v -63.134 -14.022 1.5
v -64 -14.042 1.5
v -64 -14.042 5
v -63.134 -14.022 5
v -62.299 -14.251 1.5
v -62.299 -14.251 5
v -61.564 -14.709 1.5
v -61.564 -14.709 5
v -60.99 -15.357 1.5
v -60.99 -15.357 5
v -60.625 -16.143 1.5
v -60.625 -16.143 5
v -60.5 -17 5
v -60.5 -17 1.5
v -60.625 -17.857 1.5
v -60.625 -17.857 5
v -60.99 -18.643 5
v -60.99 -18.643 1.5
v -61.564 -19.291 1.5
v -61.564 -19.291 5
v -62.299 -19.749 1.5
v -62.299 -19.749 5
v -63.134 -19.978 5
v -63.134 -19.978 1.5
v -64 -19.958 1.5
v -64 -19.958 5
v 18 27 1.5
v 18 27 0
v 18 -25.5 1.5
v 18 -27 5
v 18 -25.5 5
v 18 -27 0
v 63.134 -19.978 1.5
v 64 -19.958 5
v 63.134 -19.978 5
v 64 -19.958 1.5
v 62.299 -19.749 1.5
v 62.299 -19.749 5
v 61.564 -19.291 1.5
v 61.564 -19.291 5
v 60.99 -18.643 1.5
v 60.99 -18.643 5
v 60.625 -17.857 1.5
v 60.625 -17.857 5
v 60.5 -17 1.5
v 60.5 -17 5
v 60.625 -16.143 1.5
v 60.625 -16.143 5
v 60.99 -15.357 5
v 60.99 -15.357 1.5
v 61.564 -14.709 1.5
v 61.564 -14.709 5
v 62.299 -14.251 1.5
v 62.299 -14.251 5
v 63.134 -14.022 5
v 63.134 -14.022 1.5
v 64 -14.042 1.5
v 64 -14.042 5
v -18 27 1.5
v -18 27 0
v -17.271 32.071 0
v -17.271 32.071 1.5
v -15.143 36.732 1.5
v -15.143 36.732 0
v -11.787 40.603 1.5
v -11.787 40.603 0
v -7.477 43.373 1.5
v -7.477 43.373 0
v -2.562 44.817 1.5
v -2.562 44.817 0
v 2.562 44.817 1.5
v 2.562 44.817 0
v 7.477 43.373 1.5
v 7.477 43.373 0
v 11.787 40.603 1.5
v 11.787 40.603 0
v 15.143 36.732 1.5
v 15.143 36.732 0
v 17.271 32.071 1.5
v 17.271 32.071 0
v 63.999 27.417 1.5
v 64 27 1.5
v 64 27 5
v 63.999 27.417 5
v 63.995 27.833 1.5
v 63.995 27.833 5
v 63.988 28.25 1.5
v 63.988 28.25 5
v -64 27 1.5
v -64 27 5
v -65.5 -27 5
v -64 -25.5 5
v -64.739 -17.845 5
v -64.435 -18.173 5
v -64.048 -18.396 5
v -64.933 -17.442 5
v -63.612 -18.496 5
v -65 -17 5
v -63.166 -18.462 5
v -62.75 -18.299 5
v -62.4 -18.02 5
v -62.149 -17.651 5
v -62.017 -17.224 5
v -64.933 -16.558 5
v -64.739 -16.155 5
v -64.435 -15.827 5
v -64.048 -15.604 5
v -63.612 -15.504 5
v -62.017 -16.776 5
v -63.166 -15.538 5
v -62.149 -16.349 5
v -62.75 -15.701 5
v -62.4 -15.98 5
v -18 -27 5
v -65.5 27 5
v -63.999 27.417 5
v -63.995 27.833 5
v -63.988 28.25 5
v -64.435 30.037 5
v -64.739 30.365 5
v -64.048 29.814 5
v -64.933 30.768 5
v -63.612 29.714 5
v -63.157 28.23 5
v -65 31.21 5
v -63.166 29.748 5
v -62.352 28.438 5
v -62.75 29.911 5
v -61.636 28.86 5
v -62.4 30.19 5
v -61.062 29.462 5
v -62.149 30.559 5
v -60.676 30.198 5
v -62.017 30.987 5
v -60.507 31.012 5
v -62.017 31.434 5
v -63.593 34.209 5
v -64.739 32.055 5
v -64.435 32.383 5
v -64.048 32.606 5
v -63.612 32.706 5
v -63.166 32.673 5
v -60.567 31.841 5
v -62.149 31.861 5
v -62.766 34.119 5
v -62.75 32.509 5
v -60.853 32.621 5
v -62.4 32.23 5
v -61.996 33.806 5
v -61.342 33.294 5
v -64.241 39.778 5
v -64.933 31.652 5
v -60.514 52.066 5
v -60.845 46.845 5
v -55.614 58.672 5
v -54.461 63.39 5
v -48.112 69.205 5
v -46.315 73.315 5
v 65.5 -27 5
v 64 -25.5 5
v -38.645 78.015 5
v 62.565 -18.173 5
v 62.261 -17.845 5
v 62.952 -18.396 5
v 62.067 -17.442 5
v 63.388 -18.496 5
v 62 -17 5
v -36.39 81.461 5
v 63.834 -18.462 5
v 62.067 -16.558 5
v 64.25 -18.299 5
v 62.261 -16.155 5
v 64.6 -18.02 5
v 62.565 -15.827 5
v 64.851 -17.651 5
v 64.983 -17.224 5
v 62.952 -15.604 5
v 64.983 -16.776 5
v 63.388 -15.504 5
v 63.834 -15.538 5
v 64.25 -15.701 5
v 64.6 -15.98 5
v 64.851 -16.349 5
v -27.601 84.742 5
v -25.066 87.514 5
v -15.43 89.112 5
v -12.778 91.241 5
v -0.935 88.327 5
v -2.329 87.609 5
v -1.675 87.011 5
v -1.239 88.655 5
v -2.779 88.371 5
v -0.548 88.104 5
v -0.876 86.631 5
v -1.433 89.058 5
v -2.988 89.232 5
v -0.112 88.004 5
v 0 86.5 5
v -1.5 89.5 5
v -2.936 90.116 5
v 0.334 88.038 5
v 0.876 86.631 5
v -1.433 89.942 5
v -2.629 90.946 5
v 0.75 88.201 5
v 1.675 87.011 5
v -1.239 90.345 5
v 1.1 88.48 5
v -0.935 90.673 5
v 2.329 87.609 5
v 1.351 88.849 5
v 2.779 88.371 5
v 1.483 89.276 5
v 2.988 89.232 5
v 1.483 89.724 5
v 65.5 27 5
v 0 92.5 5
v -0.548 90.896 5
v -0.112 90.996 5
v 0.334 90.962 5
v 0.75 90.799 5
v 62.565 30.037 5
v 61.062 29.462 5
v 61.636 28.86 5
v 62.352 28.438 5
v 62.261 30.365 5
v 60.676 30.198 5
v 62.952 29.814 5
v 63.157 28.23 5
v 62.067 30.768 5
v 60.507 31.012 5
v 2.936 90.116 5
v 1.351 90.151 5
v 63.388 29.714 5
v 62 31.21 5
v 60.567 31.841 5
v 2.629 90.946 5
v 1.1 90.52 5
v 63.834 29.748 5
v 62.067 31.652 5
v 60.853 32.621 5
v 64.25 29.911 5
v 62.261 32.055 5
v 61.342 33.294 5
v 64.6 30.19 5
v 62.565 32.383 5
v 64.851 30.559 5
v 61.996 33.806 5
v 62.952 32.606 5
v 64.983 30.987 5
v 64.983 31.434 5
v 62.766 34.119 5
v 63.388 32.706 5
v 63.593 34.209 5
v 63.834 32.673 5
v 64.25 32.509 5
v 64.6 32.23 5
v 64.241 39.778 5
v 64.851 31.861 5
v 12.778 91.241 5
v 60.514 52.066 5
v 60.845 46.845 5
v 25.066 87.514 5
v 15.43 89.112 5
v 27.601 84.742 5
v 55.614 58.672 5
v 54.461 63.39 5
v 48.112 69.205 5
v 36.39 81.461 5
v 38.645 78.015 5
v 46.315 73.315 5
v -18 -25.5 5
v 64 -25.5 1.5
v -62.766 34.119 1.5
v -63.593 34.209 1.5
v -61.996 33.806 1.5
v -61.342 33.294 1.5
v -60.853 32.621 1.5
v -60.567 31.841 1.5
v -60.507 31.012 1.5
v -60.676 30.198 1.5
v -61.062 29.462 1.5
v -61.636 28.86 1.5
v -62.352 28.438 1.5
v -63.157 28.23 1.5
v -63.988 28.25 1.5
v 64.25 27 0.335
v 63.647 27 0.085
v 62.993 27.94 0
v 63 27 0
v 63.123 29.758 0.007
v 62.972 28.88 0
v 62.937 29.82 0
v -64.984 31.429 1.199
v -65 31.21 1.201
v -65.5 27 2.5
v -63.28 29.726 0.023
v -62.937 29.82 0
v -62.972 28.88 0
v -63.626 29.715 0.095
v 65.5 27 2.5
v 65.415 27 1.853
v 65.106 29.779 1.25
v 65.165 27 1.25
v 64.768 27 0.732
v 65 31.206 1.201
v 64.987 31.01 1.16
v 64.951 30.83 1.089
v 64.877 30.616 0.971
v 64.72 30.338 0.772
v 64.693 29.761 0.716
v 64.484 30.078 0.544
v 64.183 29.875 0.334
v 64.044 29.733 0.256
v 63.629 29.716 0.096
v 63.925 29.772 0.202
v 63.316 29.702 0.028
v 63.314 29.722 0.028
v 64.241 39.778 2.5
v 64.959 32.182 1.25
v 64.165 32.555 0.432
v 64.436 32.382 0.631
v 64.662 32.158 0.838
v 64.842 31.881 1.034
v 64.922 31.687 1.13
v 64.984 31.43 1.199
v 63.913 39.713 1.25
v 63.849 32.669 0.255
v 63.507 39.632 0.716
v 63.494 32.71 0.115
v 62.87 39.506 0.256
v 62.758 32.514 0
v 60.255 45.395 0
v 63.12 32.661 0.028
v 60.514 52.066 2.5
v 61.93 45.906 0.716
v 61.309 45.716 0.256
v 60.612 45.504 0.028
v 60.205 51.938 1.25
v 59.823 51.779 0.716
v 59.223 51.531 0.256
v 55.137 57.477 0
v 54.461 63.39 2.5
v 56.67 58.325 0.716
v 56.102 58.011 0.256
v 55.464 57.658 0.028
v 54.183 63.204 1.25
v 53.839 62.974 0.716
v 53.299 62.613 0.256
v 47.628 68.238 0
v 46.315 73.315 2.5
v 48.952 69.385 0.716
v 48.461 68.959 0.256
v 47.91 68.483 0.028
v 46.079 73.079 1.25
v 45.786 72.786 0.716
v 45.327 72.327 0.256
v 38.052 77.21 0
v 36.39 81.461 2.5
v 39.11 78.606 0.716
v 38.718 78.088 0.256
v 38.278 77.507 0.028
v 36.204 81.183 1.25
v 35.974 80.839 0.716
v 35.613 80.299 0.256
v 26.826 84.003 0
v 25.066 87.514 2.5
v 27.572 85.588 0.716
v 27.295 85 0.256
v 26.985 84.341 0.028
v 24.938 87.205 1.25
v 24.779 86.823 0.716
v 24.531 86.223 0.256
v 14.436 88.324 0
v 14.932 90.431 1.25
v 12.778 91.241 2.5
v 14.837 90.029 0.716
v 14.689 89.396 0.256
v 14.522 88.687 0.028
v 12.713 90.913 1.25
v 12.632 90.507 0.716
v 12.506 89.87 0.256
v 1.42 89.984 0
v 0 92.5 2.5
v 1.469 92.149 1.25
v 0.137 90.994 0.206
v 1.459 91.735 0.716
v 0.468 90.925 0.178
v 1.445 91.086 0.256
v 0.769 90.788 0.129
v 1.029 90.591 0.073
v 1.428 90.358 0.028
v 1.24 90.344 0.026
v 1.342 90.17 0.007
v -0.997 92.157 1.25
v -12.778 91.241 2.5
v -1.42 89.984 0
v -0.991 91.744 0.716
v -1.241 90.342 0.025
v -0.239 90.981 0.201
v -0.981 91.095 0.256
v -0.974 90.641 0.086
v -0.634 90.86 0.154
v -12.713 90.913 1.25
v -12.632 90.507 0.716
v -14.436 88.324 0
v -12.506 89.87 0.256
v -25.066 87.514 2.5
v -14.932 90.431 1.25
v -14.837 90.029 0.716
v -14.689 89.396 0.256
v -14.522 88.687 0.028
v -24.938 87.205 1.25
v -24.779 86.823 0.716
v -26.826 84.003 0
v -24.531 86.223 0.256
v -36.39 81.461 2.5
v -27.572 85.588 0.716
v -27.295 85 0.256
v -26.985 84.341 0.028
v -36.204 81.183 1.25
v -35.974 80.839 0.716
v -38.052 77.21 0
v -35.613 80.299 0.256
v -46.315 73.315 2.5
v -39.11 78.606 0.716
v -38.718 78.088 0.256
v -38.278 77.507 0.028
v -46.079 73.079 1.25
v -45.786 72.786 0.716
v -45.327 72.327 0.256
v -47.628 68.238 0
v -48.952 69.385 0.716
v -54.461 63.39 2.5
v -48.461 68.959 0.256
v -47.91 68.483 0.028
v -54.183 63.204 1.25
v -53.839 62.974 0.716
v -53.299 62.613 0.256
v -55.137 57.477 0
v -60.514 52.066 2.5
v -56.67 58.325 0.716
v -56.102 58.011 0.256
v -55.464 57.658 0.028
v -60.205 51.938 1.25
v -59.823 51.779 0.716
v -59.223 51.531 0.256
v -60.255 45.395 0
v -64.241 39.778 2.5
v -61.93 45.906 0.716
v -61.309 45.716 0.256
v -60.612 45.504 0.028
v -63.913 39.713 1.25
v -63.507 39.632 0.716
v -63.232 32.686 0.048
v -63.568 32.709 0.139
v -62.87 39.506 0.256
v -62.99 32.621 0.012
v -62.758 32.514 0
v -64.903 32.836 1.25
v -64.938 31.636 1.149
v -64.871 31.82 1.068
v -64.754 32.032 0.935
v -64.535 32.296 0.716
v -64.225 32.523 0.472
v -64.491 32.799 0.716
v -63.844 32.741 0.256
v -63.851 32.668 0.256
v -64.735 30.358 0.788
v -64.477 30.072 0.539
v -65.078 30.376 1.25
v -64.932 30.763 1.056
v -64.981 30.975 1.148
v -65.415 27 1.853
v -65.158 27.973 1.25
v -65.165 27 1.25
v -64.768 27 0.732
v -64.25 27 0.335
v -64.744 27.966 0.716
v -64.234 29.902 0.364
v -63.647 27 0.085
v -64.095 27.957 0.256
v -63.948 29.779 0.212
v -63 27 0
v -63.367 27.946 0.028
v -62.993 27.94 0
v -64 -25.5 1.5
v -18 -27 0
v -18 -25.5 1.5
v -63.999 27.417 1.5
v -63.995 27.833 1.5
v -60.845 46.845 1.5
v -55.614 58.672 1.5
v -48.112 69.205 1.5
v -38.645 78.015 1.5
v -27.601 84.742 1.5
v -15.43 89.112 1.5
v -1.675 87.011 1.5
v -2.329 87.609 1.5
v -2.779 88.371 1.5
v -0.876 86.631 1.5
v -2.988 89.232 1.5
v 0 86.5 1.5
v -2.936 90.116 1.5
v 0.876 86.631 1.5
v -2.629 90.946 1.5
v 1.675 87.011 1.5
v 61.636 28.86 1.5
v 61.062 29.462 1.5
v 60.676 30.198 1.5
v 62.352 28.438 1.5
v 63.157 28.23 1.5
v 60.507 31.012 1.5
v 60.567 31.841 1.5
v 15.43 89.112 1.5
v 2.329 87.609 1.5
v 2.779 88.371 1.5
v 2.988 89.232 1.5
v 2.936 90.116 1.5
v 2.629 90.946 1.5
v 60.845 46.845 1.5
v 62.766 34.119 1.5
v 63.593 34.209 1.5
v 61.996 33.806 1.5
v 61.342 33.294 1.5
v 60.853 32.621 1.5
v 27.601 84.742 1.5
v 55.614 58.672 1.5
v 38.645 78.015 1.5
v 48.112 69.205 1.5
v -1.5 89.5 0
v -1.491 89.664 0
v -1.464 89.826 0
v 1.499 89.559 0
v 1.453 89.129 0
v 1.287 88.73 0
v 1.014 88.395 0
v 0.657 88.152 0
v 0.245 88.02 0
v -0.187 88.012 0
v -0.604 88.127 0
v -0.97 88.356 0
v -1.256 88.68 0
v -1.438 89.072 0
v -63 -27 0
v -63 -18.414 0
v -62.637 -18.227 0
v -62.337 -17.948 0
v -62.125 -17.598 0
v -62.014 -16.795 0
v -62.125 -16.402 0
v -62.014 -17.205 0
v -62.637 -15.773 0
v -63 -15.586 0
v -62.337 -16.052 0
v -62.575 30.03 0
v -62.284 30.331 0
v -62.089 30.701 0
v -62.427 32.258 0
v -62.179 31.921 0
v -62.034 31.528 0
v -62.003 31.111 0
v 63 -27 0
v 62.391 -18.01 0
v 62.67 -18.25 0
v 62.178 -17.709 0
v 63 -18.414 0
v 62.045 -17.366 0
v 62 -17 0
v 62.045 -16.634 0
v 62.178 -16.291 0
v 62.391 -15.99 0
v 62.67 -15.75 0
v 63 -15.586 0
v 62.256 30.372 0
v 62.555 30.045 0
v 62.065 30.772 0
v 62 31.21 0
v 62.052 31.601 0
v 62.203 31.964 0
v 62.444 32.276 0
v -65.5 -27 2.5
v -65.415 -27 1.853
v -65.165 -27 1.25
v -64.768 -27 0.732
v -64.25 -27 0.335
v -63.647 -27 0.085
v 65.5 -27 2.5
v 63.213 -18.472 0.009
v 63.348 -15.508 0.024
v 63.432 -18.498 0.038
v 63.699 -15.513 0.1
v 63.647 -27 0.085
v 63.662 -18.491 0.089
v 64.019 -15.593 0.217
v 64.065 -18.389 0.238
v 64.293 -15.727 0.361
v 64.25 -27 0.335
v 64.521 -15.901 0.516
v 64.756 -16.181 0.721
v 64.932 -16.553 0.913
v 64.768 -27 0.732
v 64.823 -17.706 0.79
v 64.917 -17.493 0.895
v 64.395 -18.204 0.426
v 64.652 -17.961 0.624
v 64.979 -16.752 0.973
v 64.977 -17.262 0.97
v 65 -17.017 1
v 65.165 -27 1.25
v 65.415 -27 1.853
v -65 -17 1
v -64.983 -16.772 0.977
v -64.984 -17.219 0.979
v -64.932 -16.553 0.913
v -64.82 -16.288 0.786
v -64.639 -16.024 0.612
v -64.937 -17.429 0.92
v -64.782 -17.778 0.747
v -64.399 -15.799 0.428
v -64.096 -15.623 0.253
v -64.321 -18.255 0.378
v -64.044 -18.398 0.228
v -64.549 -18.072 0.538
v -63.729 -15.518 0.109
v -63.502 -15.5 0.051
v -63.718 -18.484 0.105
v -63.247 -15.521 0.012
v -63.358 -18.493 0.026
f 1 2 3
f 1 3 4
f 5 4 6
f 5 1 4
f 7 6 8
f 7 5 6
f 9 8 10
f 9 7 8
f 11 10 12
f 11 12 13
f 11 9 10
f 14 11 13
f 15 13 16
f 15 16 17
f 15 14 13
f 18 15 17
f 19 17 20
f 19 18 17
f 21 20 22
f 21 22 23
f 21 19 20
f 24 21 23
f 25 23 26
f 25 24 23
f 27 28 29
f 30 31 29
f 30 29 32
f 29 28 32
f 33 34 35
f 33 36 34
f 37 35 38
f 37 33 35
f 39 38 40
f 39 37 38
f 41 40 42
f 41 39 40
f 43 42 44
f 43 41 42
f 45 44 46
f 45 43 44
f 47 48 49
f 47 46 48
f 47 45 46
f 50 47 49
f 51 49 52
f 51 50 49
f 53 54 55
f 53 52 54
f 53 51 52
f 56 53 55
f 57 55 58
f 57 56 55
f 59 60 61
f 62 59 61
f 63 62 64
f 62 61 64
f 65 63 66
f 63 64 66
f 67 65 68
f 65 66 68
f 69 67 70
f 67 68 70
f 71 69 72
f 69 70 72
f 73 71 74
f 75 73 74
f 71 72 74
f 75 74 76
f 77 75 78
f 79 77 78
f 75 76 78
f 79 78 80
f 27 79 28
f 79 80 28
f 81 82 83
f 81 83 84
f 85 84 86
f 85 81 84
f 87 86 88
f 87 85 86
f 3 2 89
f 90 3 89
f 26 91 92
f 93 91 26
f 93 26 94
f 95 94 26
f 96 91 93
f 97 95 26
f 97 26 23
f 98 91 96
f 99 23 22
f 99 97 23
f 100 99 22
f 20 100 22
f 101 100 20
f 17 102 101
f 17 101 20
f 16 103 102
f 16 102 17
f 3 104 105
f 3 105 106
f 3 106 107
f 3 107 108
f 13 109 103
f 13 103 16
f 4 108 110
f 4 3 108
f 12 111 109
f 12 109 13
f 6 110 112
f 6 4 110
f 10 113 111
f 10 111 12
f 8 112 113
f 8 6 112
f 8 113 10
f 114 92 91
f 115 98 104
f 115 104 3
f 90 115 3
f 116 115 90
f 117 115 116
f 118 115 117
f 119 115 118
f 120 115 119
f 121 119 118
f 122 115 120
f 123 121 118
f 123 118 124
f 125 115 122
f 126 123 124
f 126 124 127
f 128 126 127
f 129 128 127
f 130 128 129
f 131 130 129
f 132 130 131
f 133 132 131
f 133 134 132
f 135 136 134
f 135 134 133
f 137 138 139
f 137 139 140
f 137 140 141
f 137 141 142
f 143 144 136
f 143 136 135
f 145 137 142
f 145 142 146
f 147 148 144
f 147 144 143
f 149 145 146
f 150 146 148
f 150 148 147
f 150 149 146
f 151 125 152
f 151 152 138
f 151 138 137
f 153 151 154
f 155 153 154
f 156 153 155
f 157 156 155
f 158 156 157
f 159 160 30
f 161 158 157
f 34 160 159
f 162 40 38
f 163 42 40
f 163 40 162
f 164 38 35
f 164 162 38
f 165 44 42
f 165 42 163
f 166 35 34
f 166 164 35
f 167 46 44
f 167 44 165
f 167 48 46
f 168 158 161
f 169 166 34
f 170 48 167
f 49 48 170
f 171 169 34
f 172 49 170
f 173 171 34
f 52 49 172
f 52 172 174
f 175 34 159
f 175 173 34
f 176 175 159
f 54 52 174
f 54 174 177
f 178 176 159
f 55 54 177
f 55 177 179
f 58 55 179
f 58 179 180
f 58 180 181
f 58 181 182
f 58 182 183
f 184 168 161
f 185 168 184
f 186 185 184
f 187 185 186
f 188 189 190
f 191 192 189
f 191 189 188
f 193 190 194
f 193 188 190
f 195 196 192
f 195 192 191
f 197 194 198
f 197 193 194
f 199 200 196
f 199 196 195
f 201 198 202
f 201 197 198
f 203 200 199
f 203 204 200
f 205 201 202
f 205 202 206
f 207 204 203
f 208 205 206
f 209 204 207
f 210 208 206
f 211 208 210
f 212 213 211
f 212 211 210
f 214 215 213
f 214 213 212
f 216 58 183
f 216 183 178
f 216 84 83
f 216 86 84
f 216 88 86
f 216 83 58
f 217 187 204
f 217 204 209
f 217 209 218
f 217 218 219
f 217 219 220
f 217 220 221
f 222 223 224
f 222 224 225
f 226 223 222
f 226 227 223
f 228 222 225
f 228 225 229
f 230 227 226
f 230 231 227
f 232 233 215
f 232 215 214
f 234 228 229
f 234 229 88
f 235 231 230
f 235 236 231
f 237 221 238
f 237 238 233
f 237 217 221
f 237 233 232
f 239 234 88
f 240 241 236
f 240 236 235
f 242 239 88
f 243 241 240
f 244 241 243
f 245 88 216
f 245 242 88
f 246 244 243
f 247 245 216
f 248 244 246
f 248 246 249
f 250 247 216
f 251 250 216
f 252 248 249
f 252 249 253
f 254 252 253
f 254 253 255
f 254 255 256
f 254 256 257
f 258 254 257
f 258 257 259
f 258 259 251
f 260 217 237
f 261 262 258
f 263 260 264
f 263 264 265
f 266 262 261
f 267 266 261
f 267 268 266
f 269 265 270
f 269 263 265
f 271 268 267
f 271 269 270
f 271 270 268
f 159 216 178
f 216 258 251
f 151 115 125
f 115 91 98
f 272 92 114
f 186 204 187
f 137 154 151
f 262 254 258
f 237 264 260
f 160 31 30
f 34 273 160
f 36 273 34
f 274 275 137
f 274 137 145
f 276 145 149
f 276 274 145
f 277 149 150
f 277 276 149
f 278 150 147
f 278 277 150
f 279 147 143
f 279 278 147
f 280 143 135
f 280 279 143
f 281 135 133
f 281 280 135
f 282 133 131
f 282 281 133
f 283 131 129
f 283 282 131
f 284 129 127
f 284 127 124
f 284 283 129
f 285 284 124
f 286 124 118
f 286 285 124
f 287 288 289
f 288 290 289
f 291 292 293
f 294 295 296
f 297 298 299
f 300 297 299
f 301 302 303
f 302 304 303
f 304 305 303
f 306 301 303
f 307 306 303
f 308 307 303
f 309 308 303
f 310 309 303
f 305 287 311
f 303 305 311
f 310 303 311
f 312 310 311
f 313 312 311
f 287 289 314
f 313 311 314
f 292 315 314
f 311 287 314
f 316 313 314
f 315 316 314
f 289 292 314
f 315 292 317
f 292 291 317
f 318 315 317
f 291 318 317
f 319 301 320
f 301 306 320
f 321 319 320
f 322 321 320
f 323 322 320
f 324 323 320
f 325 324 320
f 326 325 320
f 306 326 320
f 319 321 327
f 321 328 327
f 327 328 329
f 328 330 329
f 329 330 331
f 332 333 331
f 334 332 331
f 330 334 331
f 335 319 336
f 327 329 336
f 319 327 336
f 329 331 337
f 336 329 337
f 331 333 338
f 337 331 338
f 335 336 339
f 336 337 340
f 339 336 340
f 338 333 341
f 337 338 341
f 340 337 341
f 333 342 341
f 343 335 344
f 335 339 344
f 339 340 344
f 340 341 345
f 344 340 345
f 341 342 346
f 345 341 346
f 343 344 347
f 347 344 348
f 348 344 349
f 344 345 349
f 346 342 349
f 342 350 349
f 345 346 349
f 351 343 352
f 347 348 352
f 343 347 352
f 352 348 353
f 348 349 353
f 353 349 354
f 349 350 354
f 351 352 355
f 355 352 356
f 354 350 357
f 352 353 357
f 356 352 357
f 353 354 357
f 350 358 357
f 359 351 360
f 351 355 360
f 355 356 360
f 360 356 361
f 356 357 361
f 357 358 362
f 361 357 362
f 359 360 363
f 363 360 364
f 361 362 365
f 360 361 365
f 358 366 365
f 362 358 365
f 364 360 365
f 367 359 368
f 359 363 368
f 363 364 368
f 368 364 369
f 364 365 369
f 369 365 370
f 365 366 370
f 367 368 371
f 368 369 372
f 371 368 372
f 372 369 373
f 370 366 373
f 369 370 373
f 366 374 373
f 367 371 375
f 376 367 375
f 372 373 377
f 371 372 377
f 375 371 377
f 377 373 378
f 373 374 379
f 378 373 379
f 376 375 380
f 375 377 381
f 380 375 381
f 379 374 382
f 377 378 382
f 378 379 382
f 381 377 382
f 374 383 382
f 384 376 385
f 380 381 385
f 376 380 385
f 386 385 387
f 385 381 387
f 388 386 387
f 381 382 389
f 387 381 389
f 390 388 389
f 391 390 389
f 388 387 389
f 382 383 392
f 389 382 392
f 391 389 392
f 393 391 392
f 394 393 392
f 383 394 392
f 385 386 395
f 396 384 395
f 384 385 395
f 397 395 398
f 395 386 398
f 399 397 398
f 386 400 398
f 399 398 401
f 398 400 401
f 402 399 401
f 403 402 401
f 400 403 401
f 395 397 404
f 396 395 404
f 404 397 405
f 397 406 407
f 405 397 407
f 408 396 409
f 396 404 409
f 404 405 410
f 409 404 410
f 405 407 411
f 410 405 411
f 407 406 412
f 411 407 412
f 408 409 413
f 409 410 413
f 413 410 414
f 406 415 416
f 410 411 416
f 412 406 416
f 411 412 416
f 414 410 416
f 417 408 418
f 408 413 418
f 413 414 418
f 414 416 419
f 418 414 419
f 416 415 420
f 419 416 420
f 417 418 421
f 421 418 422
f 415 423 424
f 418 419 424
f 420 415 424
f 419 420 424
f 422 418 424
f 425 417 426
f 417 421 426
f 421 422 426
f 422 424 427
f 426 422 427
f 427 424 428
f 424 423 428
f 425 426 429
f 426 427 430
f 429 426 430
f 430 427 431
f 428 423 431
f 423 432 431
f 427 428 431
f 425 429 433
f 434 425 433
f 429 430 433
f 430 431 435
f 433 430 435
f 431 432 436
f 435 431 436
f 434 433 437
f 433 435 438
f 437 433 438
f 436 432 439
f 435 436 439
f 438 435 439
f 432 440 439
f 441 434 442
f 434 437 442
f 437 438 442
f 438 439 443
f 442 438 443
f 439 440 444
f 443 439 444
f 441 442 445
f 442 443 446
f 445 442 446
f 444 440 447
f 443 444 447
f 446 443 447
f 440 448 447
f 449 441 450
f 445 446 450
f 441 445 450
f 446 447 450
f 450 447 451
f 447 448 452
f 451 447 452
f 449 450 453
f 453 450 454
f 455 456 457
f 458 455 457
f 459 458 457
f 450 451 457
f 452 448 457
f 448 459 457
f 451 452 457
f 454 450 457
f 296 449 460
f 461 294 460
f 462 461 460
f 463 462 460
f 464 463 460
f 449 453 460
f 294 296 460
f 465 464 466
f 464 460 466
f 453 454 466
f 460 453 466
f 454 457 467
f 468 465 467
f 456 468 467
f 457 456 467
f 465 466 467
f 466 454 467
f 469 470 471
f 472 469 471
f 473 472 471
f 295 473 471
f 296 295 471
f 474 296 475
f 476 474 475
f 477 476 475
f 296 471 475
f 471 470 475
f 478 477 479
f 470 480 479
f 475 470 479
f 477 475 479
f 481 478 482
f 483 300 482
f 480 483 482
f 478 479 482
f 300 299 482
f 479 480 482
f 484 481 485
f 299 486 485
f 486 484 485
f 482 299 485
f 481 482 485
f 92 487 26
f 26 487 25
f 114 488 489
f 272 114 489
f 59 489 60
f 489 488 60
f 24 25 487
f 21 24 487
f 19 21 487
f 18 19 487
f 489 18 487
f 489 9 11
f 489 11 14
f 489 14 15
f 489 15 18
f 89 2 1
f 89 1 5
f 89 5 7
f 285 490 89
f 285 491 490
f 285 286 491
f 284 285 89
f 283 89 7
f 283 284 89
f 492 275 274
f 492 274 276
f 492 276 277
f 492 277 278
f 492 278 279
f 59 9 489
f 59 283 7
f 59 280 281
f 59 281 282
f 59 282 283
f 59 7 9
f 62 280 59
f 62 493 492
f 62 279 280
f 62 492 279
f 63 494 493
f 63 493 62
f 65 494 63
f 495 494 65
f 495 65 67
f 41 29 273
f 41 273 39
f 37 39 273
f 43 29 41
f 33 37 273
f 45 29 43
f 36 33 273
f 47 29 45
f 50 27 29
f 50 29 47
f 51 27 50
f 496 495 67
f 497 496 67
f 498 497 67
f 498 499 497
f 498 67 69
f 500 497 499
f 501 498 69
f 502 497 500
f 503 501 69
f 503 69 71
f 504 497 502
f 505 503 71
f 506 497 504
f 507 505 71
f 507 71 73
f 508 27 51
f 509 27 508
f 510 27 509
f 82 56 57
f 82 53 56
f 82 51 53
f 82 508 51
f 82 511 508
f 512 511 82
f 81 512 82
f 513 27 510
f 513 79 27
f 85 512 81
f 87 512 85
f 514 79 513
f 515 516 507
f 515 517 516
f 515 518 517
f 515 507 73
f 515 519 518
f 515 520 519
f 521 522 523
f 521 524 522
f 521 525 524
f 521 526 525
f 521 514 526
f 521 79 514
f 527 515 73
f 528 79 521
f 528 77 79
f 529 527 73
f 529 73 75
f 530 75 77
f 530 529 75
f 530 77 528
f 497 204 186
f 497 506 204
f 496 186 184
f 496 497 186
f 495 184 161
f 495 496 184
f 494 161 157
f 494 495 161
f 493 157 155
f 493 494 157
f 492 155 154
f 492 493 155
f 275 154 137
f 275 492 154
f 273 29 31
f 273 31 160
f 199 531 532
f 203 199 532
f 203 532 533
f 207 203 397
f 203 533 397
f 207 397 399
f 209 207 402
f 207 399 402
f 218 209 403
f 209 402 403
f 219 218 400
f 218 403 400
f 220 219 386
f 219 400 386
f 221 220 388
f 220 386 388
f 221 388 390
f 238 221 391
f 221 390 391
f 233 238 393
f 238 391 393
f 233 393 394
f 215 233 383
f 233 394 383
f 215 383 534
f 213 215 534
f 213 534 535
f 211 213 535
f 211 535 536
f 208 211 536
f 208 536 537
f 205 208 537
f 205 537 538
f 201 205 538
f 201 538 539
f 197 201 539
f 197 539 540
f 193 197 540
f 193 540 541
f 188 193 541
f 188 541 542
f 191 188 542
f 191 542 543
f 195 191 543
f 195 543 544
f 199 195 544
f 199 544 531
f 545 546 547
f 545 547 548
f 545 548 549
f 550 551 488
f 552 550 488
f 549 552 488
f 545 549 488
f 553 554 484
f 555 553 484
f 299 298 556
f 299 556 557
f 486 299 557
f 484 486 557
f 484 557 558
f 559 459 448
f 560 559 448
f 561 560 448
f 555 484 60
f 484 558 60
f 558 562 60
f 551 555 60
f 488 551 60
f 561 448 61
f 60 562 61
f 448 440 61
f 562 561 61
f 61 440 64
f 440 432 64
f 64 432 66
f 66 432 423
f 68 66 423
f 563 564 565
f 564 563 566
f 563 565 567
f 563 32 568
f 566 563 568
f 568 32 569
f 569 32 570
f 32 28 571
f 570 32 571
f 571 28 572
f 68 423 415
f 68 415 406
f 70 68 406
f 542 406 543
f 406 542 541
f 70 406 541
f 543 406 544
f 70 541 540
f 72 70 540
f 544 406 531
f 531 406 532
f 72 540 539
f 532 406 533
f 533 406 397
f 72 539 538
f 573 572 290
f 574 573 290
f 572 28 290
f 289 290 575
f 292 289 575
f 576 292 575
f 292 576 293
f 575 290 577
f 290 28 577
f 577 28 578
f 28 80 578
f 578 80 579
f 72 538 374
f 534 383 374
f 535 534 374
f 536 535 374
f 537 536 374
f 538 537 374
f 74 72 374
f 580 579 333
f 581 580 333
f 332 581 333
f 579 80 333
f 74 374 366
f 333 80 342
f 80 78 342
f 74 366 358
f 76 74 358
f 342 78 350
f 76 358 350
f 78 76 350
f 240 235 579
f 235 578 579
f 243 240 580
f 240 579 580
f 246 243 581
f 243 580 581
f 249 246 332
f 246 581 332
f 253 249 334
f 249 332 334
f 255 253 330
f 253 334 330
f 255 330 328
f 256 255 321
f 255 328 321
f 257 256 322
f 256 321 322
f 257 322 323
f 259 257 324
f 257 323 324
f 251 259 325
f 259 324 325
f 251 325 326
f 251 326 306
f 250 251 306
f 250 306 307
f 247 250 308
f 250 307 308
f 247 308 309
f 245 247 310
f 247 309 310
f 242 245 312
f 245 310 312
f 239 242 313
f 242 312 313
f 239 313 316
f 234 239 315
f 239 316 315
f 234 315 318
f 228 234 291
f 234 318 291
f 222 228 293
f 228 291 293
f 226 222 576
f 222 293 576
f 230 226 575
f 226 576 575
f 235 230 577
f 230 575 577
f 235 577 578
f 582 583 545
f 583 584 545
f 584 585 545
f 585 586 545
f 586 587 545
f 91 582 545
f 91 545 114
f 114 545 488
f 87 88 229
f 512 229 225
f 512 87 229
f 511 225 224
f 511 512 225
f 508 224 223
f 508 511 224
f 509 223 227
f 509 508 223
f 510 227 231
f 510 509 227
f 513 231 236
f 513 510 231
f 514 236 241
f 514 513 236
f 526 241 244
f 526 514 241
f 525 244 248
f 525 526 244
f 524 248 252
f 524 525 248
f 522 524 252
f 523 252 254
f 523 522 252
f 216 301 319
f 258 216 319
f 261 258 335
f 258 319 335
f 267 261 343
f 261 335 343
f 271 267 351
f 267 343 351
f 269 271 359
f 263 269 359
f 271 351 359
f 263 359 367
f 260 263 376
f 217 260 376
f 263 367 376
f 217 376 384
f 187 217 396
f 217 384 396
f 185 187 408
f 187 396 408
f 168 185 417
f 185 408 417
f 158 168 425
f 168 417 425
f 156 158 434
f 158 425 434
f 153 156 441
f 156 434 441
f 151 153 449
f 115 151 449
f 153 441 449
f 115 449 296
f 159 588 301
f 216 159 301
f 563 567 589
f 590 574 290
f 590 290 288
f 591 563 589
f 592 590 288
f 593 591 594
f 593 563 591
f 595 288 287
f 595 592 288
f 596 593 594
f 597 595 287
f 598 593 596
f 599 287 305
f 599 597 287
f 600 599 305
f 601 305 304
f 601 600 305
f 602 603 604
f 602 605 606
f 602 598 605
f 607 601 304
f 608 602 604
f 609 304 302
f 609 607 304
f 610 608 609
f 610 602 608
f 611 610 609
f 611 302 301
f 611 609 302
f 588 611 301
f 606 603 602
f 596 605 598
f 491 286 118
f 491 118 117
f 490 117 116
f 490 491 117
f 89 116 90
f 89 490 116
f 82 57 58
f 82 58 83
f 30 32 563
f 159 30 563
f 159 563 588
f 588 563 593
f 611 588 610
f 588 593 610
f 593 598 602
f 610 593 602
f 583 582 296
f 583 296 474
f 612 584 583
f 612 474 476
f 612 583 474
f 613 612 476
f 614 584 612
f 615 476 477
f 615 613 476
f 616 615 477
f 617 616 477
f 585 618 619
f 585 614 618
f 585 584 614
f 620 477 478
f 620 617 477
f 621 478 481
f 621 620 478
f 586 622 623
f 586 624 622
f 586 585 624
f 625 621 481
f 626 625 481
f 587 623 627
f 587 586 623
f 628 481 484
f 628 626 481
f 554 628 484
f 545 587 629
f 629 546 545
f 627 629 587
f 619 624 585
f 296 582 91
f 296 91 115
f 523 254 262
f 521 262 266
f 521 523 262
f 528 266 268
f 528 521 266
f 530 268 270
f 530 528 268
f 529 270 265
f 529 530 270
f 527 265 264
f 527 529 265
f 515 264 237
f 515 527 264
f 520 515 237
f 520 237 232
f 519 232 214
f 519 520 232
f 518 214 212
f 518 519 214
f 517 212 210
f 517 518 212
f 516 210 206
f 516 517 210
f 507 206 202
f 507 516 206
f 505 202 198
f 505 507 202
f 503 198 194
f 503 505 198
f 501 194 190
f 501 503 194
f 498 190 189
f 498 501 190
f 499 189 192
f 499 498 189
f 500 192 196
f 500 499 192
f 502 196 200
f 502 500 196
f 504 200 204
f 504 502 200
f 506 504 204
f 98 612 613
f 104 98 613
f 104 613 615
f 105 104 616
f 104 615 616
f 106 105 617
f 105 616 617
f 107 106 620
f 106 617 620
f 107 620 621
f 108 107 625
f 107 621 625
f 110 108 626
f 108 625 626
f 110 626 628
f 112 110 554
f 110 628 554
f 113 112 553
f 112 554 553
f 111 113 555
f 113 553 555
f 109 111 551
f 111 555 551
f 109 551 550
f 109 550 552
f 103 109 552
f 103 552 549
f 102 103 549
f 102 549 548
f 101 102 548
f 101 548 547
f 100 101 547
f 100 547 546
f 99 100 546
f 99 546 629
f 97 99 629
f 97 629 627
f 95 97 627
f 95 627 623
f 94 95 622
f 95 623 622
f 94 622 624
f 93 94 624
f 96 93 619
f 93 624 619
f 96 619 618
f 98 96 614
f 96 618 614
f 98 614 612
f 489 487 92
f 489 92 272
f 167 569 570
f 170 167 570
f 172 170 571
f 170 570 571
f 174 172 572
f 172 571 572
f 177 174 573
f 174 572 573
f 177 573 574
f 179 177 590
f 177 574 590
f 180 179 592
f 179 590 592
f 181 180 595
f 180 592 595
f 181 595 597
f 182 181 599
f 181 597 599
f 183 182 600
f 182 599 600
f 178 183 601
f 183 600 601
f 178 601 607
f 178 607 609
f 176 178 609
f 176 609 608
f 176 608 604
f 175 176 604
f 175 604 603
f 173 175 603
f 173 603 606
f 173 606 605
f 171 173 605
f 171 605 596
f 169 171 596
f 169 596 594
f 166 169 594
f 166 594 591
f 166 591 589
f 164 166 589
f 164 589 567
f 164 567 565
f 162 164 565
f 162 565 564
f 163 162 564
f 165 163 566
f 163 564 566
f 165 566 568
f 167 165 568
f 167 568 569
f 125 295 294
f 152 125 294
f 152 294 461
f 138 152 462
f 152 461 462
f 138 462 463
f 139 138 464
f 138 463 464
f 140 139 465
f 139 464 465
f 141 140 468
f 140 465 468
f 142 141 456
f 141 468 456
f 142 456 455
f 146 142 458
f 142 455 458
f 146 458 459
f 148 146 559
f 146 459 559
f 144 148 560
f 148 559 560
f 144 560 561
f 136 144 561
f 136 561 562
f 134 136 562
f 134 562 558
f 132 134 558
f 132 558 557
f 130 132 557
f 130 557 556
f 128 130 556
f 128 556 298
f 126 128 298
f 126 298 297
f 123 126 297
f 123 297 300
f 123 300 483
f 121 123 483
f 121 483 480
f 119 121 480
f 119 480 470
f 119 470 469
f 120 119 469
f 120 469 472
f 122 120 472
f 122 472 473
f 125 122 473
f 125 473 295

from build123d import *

# Parameters (mm, degrees)
SKETCH3_W                    = 131
SKETCH3_H                    = 54
BOSS_EXTRUDE2_DEPTH          = 5
F_3_0_3_DIAMETER_HOLE1_D     = 3
F_3_0_3_DIAMETER_HOLE1_DEPTH = 20
F_3_0_3_DIAMETER_HOLE1_TIP   = 0.901290929
SHELL1_T                     = -1.5
CUT_EXTRUDE1_DEPTH           = 114.452633288
FILLET2_START                = -28
FILLET2_DEPTH                = 120.497573337
FILLET2_2_ANGLE              = 180


with BuildPart() as part:
    # Sketch3 → Boss-Extrude2 (new body)
    with BuildSketch(Plane.XY):
        with BuildLine():
            Line((-65.5, 27), (65.5, 27))
            ThreePointArc((65.5, 27), (0, 92.5), (-65.5, 27))
        make_face()
        Rectangle(SKETCH3_W, SKETCH3_H)
    extrude(amount=BOSS_EXTRUDE2_DEPTH)

    # Ø3.0 (3) Diameter Hole1
    with Locations(Plane.XY.offset(5)):
        with Locations((-63.5, -17), (63.5, -17), (0, 89.5), (63.5, 31.210132452), (-63.5, 31.210132452)):
            Hole(F_3_0_3_DIAMETER_HOLE1_D / 2, depth=F_3_0_3_DIAMETER_HOLE1_DEPTH)
            with Locations((0, 0, -(F_3_0_3_DIAMETER_HOLE1_DEPTH + F_3_0_3_DIAMETER_HOLE1_TIP / 2))):  # 118° drill point
                Cone(0, F_3_0_3_DIAMETER_HOLE1_D / 2, F_3_0_3_DIAMETER_HOLE1_TIP, mode=Mode.SUBTRACT)

    # Shell1
    shell1_openings = [part.faces().sort_by_distance(p)[0] for p in [
        (0, 26.743328941, 5),
    ]]
    offset(amount=SHELL1_T, openings=shell1_openings)

    # Sketch6 → Cut-Extrude1 (cut, through all)
    with BuildSketch(Plane(origin=(0, 0, 0), x_dir=(-1, 0, 0), z_dir=(0, 0, -1))):
        with BuildLine():
            Line((-18, 27), (-18, -27))
            Line((-18, -27), (18, -27))
            Line((18, -27), (18, 27))
            ThreePointArc((18, 27), (0, 45), (-18, 27))
        make_face()
    extrude(amount=-CUT_EXTRUDE1_DEPTH, mode=Mode.SUBTRACT)

    # Fillet2: read off the stored shape, not the designer's step
    # Fillet2 outline → Fillet2 (cut)
    with BuildSketch(Plane(origin=(0, 0, 0), x_dir=(1, 0, 0), z_dir=(0, 1, 0)).offset(FILLET2_START)):
        with BuildLine():
            ThreePointArc((-65.5, -2.5), (-64.767766953, -0.732233047), (-63, 0))
            Line((-63, 0), (-65.5, 0))
            Line((-65.5, 0), (-65.5, -2.5))
        make_face()
        with BuildLine():
            ThreePointArc((63, 0), (64.767766953, -0.732233047), (65.5, -2.5))
            Line((65.5, -2.5), (65.5, 0))
            Line((65.5, 0), (63, 0))
        make_face()
    extrude(amount=FILLET2_DEPTH, mode=Mode.SUBTRACT)

    # Fillet2 2 outline → Fillet2 2 (revolve, cut)
    with BuildSketch(Plane.XZ.offset(-27)):
        with BuildLine():
            ThreePointArc((65.5, 2.5), (64.767766953, 0.732233047), (63, 0))
            Line((63, 0), (65.5, 0))
            Line((65.5, 0), (65.5, 2.5))
        make_face()
    revolve(axis=Axis((0, 27, 0), (0, 0, 1)), revolution_arc=FILLET2_2_ANGLE, mode=Mode.SUBTRACT)


solid = part.part
